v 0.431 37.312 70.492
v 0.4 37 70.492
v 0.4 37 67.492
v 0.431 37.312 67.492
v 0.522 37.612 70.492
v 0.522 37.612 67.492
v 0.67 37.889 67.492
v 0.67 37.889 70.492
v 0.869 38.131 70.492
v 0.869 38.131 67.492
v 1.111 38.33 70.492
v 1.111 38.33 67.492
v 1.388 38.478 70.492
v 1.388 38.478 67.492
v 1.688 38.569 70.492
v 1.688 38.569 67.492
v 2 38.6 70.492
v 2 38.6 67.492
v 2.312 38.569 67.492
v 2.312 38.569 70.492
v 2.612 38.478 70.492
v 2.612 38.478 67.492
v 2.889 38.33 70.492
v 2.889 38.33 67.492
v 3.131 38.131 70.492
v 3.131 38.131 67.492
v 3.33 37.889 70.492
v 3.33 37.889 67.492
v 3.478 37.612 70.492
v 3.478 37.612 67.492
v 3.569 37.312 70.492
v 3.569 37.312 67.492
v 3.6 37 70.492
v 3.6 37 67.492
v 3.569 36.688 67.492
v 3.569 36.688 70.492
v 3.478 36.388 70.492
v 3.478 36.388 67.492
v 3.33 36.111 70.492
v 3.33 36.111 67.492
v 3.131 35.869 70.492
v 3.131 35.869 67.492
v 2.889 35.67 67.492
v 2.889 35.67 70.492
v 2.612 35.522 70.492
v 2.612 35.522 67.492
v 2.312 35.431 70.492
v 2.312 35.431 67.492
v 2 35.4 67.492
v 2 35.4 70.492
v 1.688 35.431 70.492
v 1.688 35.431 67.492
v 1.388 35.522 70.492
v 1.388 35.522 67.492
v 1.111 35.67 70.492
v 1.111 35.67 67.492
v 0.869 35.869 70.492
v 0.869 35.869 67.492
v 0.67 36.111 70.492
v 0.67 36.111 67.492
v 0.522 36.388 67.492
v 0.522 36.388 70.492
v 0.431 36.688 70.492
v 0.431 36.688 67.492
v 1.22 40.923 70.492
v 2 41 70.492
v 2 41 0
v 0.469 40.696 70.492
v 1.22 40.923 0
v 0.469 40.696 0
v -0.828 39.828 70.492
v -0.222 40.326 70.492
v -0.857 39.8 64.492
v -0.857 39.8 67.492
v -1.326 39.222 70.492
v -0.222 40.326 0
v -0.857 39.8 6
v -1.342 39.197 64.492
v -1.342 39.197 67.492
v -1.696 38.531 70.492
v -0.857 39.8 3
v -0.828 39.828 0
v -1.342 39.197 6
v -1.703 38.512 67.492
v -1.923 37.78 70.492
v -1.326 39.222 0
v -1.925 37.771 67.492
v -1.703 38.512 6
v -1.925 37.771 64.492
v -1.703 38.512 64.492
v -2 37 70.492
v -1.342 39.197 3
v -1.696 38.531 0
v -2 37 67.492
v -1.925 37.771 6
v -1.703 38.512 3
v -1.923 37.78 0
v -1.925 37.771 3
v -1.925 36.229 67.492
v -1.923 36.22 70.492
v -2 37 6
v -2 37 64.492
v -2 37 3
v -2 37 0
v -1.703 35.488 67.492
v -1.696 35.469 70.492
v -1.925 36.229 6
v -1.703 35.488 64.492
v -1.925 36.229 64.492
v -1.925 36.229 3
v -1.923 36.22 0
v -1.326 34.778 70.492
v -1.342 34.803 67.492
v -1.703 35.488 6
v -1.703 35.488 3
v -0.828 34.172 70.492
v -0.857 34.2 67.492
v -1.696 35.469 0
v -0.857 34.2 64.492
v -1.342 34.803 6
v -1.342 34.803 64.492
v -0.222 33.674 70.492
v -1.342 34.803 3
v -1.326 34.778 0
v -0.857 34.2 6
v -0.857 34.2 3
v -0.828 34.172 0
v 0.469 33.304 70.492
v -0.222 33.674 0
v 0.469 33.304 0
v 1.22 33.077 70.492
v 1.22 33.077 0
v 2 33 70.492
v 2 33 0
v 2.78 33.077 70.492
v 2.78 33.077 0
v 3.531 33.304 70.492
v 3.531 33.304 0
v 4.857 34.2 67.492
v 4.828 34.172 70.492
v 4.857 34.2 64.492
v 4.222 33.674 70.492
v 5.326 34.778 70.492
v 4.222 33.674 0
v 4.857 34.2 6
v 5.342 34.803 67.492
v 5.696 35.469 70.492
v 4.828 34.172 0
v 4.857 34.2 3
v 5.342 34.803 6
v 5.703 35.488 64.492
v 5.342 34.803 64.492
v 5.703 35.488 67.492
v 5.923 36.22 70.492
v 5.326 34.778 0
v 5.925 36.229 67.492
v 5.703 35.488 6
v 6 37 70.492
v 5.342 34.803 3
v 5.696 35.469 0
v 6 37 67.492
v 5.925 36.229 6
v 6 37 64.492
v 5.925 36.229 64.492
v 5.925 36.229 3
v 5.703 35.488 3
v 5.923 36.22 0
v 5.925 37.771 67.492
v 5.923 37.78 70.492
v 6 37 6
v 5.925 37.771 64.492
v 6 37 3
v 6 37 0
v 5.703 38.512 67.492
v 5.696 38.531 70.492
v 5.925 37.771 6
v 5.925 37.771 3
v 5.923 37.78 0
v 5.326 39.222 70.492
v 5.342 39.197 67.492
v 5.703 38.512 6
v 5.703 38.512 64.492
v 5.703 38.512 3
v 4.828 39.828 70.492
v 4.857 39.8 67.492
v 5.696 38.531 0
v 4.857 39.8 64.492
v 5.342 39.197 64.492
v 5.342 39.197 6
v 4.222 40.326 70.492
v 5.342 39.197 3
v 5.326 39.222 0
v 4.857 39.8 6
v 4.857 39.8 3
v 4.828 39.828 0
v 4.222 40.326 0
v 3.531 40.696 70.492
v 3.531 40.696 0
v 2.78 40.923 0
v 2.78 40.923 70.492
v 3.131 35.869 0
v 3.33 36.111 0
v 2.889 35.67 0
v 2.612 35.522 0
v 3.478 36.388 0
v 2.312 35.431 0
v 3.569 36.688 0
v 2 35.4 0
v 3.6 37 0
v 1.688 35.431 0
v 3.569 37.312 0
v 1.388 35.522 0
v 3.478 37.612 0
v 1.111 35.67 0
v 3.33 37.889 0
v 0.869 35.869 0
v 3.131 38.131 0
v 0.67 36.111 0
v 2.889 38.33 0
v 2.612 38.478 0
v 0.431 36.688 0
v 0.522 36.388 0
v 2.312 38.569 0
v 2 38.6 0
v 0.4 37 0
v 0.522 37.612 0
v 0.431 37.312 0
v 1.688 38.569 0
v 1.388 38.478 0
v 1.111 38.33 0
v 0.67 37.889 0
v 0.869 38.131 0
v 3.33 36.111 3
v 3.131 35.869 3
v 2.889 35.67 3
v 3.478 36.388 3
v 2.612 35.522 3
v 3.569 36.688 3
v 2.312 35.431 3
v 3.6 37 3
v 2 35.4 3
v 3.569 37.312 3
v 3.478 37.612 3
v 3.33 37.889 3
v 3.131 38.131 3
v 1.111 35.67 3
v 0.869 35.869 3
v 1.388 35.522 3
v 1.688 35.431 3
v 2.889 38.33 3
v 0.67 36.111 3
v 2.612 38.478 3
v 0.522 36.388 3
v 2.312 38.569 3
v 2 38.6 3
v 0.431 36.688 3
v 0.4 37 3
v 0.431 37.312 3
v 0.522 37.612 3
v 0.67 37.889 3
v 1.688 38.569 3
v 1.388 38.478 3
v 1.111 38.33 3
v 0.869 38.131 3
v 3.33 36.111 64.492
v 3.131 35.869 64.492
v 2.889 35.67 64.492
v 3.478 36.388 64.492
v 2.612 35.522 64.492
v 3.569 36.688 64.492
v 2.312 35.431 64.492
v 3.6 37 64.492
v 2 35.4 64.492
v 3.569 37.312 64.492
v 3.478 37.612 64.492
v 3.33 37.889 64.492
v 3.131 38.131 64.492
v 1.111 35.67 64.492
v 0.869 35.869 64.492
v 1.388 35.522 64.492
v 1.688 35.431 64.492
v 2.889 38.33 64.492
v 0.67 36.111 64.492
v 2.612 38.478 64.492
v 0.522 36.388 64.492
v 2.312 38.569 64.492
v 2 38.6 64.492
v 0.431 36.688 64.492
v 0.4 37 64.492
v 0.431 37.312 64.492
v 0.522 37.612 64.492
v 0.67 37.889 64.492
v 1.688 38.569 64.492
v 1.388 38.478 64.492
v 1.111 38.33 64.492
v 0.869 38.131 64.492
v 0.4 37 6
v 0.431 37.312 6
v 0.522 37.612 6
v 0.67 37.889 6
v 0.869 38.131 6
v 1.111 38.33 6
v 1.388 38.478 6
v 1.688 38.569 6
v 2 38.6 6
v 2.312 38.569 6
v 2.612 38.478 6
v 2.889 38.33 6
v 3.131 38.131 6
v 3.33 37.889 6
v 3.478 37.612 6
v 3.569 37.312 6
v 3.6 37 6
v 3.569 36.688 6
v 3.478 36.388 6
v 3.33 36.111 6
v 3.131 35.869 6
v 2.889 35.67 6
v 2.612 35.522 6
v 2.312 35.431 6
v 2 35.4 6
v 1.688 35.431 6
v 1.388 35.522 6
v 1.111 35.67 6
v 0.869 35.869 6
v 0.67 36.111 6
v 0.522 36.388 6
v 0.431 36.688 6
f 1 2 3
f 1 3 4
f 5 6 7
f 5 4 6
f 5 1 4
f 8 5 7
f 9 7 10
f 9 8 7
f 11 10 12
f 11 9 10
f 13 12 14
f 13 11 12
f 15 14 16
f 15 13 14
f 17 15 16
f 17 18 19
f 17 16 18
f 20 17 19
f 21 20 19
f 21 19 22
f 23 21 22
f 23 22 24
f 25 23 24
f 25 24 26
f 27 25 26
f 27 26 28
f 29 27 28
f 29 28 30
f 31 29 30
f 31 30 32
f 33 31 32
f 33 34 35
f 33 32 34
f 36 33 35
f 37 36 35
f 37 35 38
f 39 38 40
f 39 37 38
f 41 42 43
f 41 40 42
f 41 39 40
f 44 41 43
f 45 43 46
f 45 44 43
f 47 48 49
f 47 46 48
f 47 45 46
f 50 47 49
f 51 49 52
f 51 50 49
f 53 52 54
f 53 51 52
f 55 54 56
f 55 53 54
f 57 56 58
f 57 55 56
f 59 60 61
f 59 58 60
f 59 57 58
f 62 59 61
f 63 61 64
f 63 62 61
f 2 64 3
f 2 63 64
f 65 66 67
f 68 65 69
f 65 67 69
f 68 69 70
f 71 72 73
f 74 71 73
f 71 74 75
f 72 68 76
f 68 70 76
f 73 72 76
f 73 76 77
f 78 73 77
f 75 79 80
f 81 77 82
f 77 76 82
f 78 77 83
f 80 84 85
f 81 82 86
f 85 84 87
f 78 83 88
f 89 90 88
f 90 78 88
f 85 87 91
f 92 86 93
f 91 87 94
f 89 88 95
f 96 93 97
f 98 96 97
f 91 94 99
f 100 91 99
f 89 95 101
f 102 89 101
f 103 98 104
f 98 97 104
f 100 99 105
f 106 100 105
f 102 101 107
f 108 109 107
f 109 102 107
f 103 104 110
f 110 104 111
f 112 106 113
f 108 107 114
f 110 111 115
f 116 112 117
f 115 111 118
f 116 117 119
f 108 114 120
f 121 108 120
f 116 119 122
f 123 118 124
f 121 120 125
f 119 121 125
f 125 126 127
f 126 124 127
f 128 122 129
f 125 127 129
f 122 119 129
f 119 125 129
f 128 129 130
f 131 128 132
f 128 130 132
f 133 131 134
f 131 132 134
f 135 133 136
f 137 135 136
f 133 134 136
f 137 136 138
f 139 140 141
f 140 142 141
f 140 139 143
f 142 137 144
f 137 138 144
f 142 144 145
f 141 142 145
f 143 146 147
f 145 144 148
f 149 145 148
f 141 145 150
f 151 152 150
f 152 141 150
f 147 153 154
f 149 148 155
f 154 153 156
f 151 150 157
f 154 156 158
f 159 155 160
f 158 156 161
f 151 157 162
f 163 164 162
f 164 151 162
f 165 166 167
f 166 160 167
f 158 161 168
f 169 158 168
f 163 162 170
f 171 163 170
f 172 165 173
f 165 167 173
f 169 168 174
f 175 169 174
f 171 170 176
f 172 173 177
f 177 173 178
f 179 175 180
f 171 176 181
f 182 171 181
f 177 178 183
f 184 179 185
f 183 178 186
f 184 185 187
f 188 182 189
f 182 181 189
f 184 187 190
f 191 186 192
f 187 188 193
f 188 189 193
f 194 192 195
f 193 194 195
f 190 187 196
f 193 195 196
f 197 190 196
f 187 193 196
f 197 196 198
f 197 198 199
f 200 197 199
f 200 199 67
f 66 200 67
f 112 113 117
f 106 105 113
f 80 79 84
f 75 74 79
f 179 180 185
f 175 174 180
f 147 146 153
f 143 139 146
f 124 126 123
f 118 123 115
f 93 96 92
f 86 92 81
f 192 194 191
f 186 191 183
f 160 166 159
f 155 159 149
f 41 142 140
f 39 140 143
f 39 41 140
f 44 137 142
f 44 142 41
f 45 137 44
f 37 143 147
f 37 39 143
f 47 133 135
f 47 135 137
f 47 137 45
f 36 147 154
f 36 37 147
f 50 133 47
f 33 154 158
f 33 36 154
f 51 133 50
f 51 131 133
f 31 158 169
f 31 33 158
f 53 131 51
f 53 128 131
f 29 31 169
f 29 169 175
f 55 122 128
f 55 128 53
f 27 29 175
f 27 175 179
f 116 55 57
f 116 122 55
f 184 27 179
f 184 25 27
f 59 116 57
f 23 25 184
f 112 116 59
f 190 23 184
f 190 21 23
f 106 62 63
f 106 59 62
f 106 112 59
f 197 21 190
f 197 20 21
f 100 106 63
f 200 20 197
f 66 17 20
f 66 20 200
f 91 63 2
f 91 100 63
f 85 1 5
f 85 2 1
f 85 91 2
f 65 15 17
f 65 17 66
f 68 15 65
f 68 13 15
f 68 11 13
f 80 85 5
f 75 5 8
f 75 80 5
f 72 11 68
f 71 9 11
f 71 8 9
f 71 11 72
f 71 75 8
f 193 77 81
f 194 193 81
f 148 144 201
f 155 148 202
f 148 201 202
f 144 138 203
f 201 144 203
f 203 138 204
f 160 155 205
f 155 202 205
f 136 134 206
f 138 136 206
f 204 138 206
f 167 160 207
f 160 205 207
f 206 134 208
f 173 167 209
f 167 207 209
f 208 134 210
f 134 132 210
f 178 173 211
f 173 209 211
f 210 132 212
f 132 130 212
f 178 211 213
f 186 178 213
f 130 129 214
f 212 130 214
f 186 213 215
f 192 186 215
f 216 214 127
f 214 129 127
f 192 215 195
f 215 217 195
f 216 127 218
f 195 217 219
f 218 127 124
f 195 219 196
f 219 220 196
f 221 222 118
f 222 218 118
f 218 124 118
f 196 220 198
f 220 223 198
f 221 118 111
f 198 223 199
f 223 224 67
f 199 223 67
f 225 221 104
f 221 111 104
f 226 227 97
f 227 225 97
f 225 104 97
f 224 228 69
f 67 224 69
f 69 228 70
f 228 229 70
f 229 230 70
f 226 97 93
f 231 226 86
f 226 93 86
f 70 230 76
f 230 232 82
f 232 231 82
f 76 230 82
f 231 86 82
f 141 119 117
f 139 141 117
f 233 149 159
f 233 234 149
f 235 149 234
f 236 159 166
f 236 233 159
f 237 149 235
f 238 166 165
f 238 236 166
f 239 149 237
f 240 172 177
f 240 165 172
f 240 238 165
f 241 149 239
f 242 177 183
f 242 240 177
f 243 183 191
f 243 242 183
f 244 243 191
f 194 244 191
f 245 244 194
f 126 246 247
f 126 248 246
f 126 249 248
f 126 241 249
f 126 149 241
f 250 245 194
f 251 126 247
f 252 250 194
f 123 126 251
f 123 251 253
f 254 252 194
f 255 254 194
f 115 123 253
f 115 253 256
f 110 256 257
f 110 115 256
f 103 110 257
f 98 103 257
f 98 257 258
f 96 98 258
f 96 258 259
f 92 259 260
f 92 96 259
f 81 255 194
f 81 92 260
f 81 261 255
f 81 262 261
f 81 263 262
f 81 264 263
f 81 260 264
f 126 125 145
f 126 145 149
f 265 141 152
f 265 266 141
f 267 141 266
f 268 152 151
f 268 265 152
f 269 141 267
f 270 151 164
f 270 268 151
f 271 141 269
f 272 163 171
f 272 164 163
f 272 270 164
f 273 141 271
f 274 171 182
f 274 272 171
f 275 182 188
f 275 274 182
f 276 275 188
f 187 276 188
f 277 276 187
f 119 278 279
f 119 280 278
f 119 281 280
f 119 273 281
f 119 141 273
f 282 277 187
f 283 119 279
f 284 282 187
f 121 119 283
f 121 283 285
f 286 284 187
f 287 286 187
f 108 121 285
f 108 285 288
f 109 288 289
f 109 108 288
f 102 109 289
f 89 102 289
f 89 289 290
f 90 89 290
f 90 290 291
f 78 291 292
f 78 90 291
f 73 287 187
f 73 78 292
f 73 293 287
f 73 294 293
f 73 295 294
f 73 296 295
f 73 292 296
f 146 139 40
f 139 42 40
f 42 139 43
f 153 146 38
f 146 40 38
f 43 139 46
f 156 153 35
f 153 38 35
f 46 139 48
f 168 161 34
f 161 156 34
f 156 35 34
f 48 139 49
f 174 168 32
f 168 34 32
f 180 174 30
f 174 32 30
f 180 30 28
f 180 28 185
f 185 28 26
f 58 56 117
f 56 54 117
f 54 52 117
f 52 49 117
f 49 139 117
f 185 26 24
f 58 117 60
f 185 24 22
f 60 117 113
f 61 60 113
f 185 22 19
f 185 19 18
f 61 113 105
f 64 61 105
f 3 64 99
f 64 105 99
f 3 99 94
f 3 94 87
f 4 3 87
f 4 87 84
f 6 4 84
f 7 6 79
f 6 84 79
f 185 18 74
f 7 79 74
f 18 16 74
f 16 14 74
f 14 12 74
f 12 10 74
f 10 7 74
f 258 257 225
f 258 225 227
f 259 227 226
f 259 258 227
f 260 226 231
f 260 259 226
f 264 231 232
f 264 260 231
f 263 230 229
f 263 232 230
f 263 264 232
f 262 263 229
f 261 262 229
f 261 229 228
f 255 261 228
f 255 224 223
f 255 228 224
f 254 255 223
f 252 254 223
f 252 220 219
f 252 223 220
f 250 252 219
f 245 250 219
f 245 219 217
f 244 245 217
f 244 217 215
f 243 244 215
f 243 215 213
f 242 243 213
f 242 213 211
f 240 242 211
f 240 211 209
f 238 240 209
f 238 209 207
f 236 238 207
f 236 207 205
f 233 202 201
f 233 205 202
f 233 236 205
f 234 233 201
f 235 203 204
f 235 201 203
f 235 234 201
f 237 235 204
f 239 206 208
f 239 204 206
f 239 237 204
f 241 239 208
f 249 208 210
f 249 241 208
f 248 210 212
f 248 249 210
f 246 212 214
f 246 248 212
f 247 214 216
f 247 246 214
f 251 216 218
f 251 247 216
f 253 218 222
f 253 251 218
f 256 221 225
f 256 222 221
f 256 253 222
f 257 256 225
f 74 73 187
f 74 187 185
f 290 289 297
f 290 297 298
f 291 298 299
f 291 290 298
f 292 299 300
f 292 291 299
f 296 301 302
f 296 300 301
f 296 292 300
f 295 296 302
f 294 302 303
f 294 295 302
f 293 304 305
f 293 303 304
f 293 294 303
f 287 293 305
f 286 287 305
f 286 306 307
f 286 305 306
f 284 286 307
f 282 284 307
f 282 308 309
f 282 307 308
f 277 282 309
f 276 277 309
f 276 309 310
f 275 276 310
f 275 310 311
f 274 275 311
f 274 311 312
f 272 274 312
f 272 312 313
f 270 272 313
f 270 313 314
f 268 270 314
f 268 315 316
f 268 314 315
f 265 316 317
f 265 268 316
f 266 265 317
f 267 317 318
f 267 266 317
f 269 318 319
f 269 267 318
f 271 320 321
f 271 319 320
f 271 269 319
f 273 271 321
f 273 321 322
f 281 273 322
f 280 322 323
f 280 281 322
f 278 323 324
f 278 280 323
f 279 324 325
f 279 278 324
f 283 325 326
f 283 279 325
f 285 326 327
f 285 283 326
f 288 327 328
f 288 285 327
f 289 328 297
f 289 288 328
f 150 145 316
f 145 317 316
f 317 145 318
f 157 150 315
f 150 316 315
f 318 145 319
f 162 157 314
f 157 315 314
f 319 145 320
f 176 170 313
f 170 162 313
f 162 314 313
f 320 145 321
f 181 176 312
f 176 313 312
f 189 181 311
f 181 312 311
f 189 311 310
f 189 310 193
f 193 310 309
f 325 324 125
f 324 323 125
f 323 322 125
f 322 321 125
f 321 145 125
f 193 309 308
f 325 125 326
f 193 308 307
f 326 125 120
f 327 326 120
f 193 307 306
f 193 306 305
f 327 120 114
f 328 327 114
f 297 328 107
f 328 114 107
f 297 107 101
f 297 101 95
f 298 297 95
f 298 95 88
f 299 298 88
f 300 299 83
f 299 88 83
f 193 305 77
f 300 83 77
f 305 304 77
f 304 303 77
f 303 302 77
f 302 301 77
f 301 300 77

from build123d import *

# Parameters (mm, degrees)
SKETCH_1_R               = 4
EXTRUDE_1_DEPTH          = 70.491679884
CUT_EXTRUDE_1_DEPTH      = 82.76843482
CUT_EXTRUDE_1_DEPTH_BACK = 82.76843482
SKETCH_2_R               = 1.6
CUT_EXTRUDE_START        = -82.76843482
SKETCH_3_W               = 3
SKETCH_3_H               = 5.6
CUT_EXTRUDE_2_DEPTH      = 150.536869639


with BuildPart() as part:
    # ｽｹｯﾁ1 → ﾎﾞｽ - 押し出し1 (new body)
    with BuildSketch(Plane.XY):
        with Locations(Location((2, 37, 0), (0, 0, 90))):
            Circle(SKETCH_1_R)
    extrude(amount=EXTRUDE_1_DEPTH)

    # ｽｹｯﾁ2 → ｶｯﾄ - 押し出し1 (cut, two sides: drawn at the far end of the back side and taken through both)
    with BuildSketch(Plane(origin=(0, 0, 0), x_dir=(-1, 0, 0), z_dir=(0, 0, -1)).offset(-CUT_EXTRUDE_1_DEPTH_BACK)):
        with Locations((-2, 37)):
            Circle(SKETCH_2_R)
    extrude(amount=CUT_EXTRUDE_1_DEPTH + CUT_EXTRUDE_1_DEPTH_BACK, mode=Mode.SUBTRACT)

    # ｽｹｯﾁ3 → ｶｯﾄ - 押し出し2 (cut)
    with BuildSketch(Plane(origin=(0, 0, 0), x_dir=(0, 0, -1), z_dir=(1, 0, 0)).offset(CUT_EXTRUDE_START)):
        with Locations((-4.5, 37)):
            Rectangle(SKETCH_3_W, SKETCH_3_H)
    cut_extrude_2 = extrude(amount=CUT_EXTRUDE_2_DEPTH, mode=Mode.SUBTRACT)

    # ﾐﾗｰ1: ｶｯﾄ - 押し出し2 across plane
    add(cut_extrude_2.mirror(Plane(origin=(0, 0, 35.245839942), x_dir=(1, 0, 0), z_dir=(0, 0, -1))), mode=Mode.SUBTRACT)


solid = part.part
